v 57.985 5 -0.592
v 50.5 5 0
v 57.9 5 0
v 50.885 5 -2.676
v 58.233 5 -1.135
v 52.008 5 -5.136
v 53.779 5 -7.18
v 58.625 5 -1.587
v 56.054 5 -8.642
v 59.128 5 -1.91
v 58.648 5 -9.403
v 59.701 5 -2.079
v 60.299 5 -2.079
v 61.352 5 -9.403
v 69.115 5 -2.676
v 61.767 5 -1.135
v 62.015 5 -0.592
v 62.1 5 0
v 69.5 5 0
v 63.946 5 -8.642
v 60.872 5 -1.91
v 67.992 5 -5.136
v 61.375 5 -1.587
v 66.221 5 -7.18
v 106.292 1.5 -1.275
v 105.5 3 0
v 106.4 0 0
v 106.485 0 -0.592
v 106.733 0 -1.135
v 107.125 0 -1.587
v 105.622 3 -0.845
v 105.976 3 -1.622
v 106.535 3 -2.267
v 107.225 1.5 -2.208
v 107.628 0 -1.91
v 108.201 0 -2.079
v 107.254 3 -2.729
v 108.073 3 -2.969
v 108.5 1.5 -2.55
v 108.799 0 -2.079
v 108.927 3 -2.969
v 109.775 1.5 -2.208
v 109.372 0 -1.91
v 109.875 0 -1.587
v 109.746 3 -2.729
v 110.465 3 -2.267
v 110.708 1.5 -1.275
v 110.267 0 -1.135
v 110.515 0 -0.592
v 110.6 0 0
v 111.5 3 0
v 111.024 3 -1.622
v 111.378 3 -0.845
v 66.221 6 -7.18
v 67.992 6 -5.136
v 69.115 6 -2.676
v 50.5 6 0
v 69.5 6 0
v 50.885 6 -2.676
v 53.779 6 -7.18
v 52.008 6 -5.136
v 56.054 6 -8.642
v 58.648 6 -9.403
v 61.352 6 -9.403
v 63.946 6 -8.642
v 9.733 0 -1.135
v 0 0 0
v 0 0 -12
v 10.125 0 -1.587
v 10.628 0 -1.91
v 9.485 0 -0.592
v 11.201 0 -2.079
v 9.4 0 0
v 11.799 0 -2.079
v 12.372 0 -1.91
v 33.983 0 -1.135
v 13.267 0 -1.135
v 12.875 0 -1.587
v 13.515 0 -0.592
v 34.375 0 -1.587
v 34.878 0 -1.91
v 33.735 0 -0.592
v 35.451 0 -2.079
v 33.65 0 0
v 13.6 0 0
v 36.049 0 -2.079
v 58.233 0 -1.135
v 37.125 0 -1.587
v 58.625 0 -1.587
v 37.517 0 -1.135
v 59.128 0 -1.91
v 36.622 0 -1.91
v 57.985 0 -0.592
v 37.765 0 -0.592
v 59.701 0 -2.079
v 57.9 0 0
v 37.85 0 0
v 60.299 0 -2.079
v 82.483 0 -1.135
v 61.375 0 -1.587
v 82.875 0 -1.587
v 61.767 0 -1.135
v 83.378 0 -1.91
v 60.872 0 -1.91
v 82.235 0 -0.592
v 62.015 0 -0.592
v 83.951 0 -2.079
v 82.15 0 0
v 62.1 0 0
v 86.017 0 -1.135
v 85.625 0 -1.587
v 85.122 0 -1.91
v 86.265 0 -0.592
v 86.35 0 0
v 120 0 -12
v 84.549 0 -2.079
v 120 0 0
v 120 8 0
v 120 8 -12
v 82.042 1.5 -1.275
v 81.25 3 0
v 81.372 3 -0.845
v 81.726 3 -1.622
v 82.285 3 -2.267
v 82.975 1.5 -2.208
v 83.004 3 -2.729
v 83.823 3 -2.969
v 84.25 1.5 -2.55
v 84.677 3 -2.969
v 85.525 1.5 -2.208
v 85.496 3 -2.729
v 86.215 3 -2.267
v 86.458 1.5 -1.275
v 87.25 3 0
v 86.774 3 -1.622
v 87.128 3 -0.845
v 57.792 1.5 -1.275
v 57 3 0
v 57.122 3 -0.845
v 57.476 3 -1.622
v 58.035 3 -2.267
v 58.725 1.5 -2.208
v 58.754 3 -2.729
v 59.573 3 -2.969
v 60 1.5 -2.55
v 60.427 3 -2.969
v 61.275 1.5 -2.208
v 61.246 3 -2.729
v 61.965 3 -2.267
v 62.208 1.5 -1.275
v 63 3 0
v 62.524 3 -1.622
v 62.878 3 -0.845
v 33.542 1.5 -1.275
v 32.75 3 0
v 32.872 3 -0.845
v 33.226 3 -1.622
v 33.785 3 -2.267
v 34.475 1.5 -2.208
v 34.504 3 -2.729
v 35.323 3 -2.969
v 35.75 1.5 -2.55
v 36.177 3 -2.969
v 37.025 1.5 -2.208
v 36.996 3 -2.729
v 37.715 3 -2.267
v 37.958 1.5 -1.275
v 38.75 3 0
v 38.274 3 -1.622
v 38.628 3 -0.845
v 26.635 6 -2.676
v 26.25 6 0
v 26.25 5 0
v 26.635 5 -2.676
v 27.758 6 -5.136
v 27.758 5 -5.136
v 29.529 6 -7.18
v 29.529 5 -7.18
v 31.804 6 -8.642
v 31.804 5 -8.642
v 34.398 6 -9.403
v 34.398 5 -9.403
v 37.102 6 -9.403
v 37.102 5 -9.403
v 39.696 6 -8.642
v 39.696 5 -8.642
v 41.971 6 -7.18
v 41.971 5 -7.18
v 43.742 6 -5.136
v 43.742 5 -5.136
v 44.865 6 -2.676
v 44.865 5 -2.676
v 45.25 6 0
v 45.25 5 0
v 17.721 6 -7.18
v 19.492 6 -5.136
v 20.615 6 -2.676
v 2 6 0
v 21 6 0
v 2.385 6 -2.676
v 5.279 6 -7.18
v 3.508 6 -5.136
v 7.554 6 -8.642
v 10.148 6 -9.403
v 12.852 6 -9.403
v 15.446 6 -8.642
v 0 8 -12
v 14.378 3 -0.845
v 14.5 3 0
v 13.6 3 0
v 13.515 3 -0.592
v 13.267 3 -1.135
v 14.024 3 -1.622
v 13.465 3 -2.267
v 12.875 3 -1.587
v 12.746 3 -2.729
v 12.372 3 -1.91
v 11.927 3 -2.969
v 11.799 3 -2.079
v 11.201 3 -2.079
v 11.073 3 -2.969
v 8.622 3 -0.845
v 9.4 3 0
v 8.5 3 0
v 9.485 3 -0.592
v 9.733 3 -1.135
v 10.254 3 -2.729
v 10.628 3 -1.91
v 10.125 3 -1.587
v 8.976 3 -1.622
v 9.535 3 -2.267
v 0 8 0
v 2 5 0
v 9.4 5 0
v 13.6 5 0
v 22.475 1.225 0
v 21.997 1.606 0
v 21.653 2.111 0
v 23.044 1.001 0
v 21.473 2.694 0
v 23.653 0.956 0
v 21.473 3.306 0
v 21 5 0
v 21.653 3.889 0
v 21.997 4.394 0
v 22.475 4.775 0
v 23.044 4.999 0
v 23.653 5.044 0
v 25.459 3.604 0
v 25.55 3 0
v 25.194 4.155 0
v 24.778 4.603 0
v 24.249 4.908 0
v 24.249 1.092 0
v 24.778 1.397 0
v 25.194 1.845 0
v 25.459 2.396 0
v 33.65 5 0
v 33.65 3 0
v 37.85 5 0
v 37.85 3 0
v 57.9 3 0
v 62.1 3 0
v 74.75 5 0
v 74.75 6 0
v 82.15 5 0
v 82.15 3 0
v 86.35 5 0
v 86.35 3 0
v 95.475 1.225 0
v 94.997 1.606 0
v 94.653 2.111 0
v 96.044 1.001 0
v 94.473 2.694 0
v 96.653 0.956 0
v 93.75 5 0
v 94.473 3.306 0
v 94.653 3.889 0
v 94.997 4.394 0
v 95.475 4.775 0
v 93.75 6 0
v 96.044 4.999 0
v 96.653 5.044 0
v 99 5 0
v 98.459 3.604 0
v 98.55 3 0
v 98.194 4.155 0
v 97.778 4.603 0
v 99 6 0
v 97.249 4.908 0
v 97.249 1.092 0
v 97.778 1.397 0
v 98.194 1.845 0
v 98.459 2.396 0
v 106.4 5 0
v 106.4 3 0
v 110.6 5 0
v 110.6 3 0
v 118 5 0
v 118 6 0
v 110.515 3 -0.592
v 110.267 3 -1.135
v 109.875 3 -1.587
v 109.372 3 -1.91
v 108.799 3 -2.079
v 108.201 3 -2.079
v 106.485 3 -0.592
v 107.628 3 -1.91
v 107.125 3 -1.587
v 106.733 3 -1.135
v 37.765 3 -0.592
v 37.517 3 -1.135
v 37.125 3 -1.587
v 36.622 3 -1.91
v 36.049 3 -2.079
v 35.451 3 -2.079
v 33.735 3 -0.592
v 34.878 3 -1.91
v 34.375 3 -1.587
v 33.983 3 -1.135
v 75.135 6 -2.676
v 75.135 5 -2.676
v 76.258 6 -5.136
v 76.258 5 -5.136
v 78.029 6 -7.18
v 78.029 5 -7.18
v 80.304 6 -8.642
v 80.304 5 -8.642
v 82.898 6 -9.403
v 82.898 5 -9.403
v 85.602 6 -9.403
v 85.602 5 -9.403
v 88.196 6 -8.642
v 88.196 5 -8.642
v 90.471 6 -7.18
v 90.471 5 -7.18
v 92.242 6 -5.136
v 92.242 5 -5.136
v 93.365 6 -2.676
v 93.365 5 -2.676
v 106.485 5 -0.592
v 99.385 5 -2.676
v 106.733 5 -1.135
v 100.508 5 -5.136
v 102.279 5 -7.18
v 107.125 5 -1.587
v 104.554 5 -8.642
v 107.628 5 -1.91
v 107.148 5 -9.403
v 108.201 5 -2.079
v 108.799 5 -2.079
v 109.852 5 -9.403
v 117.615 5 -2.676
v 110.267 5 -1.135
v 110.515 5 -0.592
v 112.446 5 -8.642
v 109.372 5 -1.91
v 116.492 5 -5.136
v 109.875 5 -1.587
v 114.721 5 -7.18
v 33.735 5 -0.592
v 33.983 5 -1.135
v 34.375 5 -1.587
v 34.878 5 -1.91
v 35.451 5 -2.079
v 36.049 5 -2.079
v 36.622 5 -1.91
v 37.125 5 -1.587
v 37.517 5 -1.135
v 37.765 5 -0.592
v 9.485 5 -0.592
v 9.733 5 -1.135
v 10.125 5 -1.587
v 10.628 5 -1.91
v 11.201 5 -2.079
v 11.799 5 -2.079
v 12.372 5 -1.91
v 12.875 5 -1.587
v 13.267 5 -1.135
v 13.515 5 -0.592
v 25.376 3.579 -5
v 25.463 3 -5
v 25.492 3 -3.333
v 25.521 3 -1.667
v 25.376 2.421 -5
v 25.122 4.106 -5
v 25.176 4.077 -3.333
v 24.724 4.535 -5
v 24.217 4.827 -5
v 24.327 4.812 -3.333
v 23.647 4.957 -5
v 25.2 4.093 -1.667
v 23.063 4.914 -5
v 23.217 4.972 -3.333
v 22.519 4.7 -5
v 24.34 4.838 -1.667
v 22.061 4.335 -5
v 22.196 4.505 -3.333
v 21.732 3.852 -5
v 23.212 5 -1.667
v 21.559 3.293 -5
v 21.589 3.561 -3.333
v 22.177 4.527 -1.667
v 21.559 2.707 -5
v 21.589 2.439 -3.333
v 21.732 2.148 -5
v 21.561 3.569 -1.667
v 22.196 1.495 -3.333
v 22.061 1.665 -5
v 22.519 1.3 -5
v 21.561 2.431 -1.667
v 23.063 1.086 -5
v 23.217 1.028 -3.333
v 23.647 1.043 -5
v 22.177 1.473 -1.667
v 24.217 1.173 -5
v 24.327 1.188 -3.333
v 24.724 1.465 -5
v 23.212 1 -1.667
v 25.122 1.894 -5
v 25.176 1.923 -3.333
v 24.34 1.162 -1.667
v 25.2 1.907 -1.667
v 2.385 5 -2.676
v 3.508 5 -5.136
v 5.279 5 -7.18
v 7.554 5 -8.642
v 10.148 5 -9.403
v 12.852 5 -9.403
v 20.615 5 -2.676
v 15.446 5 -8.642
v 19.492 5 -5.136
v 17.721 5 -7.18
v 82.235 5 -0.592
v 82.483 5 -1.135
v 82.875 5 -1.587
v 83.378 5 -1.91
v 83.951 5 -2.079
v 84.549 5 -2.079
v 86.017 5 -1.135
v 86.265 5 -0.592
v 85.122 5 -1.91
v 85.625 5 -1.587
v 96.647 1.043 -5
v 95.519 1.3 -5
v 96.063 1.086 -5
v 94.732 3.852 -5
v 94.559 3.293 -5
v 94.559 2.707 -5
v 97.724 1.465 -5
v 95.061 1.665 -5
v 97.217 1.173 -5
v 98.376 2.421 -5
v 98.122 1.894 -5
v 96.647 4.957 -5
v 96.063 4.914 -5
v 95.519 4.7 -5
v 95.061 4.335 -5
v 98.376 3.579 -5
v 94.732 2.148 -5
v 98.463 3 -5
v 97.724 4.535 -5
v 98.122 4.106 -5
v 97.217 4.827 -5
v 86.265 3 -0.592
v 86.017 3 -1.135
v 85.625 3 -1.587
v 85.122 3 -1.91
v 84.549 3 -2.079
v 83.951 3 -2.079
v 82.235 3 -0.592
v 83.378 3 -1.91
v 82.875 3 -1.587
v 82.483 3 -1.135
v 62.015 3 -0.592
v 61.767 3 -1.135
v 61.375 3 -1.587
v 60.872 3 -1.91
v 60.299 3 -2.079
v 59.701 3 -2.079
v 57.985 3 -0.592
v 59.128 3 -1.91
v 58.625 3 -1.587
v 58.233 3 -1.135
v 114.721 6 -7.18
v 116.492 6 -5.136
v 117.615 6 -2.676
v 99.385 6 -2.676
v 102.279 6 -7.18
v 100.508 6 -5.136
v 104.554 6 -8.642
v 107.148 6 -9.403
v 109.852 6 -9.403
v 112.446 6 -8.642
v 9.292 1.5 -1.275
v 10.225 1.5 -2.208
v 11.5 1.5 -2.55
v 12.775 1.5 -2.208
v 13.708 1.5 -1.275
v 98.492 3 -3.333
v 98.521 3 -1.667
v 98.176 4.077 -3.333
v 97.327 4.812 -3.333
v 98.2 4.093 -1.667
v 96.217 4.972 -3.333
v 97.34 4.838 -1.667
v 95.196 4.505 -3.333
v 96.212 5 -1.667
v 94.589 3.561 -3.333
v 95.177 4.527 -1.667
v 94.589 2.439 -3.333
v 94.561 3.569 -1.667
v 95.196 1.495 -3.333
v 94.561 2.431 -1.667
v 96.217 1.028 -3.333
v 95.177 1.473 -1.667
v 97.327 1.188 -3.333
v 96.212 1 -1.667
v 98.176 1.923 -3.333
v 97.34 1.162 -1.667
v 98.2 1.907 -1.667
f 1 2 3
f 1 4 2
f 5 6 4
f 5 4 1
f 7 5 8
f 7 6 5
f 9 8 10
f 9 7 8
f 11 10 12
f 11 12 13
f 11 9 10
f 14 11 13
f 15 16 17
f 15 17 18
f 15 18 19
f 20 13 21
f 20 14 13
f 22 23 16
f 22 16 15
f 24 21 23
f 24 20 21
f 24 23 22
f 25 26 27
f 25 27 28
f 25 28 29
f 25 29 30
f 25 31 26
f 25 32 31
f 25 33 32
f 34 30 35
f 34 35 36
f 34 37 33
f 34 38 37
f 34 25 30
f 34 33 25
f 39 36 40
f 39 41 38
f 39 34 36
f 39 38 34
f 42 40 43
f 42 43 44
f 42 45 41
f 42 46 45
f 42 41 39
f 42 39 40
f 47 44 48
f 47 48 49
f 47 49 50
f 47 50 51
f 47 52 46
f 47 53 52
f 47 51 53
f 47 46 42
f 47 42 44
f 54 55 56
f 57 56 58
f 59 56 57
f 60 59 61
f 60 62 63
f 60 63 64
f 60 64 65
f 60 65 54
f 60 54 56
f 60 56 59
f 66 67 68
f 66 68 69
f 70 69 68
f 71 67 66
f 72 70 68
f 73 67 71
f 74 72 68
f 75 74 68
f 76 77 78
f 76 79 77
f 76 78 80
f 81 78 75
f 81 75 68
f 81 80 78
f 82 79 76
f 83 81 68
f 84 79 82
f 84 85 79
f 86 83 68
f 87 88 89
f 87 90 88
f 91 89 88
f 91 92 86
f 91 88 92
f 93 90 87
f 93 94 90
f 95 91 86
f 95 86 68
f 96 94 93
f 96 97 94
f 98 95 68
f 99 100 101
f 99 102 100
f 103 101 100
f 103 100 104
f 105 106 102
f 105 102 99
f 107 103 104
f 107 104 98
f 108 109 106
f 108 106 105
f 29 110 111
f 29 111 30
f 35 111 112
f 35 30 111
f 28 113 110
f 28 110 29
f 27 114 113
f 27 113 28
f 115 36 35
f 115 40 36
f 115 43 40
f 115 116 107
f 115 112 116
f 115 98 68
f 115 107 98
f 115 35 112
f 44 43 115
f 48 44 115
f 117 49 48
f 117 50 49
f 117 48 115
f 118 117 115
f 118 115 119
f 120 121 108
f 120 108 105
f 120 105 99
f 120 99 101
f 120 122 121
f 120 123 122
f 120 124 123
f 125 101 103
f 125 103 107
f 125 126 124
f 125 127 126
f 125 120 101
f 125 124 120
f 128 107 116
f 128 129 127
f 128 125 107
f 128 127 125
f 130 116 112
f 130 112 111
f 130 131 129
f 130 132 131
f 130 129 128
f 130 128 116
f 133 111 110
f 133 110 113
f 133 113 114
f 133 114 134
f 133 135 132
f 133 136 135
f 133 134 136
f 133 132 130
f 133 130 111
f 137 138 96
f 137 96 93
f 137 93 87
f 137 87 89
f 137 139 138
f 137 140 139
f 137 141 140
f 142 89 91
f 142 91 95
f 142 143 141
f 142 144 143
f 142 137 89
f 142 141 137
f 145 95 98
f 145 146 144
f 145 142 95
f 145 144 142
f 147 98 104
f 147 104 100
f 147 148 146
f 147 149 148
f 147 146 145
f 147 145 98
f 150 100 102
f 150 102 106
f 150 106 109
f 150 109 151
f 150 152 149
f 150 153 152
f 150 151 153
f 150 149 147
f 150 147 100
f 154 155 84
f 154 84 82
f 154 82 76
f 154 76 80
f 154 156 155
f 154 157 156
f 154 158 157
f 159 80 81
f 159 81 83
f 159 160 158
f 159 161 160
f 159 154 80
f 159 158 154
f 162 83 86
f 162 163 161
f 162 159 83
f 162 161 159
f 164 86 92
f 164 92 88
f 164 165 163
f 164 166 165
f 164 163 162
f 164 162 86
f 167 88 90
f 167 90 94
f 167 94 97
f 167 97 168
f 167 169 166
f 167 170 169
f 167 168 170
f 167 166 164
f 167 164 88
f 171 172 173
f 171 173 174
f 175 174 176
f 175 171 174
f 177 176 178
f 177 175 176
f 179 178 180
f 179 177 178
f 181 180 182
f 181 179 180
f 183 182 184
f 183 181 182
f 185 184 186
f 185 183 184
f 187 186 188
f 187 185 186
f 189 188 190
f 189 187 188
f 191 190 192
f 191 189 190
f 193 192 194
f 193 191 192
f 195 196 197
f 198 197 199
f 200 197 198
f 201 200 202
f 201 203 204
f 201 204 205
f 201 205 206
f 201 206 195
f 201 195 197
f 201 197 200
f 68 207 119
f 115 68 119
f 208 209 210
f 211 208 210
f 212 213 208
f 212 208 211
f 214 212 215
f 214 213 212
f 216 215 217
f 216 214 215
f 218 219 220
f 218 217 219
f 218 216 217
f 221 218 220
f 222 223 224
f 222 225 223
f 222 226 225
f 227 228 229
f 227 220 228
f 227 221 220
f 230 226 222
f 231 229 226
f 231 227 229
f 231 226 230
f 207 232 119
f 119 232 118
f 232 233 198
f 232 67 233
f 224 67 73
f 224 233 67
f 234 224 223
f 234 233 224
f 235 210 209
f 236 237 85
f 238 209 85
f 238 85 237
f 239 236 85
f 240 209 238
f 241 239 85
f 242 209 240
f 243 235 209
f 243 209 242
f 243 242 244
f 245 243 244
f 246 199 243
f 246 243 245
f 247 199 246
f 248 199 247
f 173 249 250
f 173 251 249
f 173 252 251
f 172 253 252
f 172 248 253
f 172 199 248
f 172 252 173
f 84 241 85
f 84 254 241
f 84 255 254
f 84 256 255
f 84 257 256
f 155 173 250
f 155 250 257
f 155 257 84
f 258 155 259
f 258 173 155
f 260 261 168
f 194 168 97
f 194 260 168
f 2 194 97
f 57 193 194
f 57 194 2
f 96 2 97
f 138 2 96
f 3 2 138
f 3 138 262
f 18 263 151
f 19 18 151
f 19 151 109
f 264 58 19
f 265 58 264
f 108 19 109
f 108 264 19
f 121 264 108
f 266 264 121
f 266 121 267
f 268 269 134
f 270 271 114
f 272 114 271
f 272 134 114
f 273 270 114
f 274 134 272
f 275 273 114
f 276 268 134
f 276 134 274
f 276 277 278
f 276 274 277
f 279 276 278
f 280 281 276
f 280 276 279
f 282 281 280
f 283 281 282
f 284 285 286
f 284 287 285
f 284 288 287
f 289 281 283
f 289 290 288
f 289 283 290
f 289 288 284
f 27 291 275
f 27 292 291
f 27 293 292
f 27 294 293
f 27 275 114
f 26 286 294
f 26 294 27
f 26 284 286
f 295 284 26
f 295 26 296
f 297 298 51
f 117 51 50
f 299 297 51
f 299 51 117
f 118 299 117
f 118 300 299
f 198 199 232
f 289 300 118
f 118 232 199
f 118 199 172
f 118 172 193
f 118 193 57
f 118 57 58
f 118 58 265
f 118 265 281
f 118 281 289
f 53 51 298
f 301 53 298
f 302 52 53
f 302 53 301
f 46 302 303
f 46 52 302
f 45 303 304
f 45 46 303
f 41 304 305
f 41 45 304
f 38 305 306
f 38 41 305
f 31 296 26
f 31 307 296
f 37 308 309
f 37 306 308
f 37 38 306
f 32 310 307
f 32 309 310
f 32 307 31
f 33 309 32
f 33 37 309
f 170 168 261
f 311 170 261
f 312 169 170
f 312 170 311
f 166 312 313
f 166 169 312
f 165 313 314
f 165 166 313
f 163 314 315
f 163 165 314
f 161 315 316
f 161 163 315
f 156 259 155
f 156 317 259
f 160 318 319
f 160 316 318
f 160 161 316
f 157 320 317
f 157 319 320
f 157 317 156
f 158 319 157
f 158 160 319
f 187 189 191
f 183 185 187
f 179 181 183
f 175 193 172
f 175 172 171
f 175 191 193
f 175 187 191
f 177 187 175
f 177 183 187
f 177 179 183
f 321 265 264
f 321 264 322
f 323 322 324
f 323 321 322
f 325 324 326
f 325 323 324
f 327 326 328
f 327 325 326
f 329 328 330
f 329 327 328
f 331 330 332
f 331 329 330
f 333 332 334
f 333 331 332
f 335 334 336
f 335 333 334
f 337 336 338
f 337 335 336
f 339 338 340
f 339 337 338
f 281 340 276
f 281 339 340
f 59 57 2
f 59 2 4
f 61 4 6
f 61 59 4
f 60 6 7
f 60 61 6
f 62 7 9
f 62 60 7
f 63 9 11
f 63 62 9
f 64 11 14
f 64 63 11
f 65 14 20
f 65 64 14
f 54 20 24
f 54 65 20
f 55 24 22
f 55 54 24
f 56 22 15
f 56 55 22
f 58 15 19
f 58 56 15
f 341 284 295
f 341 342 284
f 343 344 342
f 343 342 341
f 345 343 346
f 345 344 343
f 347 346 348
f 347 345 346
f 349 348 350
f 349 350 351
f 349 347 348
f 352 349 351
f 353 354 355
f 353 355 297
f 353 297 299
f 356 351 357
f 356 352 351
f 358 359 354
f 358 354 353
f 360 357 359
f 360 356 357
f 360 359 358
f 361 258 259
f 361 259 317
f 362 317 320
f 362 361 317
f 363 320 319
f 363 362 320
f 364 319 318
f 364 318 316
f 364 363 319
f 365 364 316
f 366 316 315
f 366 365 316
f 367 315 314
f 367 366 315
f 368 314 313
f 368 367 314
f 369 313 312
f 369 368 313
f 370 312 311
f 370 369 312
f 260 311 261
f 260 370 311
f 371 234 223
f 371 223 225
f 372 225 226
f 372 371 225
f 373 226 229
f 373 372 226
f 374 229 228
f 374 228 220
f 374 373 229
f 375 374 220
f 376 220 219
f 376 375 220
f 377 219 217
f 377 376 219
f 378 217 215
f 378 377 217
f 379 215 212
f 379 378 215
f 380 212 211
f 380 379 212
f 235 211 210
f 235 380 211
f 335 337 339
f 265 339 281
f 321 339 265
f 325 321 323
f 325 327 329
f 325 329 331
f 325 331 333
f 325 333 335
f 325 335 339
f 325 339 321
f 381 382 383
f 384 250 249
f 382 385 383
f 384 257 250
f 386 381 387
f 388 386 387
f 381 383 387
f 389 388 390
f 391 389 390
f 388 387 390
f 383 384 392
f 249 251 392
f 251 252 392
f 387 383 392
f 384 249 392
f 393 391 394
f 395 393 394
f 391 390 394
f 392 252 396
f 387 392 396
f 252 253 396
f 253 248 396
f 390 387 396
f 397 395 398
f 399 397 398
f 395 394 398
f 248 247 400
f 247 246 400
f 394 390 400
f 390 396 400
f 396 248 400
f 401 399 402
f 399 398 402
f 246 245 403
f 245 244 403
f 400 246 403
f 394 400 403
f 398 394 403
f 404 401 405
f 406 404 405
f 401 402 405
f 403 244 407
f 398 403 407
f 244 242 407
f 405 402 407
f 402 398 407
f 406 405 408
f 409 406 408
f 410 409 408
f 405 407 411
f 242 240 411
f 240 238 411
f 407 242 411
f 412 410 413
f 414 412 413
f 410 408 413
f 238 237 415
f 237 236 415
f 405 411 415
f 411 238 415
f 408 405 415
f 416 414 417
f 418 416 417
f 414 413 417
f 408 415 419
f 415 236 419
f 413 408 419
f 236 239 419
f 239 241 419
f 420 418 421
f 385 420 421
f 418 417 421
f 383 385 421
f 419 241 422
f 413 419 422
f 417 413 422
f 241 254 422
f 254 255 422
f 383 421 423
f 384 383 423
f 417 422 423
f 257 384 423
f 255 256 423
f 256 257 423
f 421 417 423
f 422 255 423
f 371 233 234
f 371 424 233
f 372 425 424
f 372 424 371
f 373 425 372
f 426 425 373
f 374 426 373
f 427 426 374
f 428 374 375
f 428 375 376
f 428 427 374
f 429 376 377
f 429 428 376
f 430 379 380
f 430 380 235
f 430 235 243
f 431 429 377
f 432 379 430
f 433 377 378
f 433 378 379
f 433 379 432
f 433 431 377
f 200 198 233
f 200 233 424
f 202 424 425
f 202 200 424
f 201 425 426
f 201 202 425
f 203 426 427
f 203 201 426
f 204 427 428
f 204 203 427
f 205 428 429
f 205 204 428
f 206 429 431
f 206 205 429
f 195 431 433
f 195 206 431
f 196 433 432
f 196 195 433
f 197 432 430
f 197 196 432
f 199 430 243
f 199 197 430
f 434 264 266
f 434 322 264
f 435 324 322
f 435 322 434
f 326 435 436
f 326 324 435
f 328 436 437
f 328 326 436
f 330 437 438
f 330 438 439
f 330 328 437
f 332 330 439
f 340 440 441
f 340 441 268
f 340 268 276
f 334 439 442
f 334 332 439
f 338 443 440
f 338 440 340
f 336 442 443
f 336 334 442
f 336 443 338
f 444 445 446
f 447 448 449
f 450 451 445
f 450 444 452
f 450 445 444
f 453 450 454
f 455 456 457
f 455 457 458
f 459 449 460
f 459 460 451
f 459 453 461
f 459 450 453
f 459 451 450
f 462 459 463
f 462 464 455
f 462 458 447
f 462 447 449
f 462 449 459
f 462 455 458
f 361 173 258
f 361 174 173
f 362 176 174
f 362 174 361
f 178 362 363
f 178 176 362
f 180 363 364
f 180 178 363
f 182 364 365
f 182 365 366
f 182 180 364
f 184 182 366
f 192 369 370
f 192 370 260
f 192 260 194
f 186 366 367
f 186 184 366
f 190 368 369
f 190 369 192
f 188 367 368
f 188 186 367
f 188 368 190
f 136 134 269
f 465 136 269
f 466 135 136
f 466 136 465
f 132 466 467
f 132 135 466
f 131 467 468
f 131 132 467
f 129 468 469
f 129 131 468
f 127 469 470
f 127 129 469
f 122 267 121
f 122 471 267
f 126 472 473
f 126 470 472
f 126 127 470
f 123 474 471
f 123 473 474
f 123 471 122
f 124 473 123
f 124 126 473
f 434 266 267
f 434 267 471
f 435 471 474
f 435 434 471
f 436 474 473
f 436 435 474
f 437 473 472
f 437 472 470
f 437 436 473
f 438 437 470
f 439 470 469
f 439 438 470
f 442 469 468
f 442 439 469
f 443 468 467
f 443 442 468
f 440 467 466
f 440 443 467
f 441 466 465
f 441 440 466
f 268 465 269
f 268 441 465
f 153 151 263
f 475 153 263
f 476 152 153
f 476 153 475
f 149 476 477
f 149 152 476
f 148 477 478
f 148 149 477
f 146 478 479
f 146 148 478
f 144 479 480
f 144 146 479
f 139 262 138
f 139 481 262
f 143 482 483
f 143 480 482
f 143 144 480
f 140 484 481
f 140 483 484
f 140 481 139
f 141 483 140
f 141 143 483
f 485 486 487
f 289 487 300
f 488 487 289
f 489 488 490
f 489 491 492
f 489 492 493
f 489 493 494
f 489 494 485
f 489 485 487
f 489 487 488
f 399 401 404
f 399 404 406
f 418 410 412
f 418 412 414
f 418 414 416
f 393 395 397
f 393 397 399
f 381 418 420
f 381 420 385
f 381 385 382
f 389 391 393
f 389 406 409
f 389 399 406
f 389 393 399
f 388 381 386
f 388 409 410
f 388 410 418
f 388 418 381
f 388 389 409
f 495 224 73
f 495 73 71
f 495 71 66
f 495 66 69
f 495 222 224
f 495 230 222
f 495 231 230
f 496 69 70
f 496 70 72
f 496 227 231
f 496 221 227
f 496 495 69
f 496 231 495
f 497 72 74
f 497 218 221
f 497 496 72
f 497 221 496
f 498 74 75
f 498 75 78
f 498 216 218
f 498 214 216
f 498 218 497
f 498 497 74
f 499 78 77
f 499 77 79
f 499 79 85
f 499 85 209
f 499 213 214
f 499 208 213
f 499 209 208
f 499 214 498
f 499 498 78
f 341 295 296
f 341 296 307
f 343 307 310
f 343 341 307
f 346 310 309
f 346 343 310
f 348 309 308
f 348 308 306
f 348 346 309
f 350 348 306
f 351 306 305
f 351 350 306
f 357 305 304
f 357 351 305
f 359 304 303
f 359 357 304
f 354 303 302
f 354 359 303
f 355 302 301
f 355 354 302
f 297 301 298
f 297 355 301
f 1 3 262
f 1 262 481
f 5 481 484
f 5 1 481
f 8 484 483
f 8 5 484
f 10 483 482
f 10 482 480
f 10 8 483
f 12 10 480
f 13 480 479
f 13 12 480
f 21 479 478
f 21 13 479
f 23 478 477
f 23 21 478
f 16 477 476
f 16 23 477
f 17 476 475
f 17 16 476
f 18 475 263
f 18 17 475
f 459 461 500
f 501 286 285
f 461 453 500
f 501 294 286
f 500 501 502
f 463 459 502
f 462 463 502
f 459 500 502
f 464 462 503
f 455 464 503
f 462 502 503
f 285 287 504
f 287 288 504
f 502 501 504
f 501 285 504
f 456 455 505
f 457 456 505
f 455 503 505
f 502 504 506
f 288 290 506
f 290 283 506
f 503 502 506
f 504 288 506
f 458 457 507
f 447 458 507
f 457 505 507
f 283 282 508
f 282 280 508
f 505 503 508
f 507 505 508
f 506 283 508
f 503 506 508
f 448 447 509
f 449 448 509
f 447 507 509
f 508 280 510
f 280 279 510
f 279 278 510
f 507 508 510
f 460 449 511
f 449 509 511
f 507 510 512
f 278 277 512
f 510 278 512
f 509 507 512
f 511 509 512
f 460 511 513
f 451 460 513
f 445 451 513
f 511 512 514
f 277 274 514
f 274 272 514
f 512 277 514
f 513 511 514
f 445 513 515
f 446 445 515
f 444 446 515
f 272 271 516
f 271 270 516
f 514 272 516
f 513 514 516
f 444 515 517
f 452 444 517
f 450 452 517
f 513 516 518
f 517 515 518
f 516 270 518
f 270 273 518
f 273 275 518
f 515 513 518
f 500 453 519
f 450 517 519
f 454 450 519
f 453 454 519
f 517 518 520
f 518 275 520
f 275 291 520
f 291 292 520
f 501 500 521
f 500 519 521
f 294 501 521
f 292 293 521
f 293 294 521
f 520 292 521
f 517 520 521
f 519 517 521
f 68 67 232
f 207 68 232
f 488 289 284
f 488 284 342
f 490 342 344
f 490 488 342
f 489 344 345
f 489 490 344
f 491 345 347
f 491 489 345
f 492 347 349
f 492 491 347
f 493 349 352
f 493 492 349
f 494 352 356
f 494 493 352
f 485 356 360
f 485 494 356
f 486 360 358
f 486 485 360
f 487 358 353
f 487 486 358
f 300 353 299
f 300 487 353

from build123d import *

# Parameters (mm, degrees)
SKETCH2_W                    = 120
SKETCH2_H                    = 8
BOSS_EXTRUDE1_DEPTH          = 12
LPATTERN1_COUNT              = 5
LPATTERN1_PITCH              = 24.25
SKETCH4_R                    = 2.05
CUT_EXTRUDE1_DEPTH           = 5
CUT_EXTRUDE1_DRAFT           = -1
CUT_EXTRUDE1_PROFILE_2_DEPTH = 5
CUT_EXTRUDE1_PROFILE_2_DRAFT = -1


with BuildPart() as part:
    # Sketch2 → Boss-Extrude1 (new body)
    with BuildSketch(Plane.XY):
        with Locations((60, 4)):
            Rectangle(SKETCH2_W, SKETCH2_H)
    extrude(amount=-BOSS_EXTRUDE1_DEPTH)

    # Sketch3 → Cut-Revolve1 (revolve, cut)
    with BuildSketch(Plane.XY):
        Polygon((8.5, 3), (9.4, 3), (9.4, 5), (2, 5), (2, 6), (11.5, 6), (11.5, 0), (9.4, 0), align=None)
    cut_revolve1 = revolve(axis=Axis((11.5, 6, 0), (0, -1, 0)), mode=Mode.SUBTRACT)

    # LPattern1: Cut-Revolve1 ×5
    with Locations(*[(i * LPATTERN1_PITCH, 0, 0) for i in range(1, LPATTERN1_COUNT)]):
        add(cut_revolve1, mode=Mode.SUBTRACT)


with BuildPart() as cut_extrude1_tool:
    # Sketch4 → Cut-Extrude1 (with draft: the straight prism first)
    with BuildSketch(Plane.XY):
        with Locations((23.5, 3)):
            Circle(SKETCH4_R)
    extrude(amount=-CUT_EXTRUDE1_DEPTH)
    # Cut-Extrude1: the draft: its side faces are tilted about the plane it starts from
    cut_extrude1_sides = [cut_extrude1_tool.faces().sort_by_distance(p)[0] for p in [
        (21.45, 3, -2.5),
    ]]
    draft(cut_extrude1_sides, Plane.XY, CUT_EXTRUDE1_DRAFT)


with BuildPart() as part_1:
    add(part.part)

    # Cut-Extrude1: cut by cut_extrude1_tool
    add(cut_extrude1_tool.part, mode=Mode.SUBTRACT)


with BuildPart() as cut_extrude1_profile_2_tool:
    # Sketch4 → Cut-Extrude1 profile 2 (with draft: the straight prism first)
    with BuildSketch(Plane.XY):
        with Locations((96.5, 3)):
            Circle(SKETCH4_R)
    extrude(amount=-CUT_EXTRUDE1_PROFILE_2_DEPTH)
    # Cut-Extrude1 profile 2: the draft: its side faces are tilted about the plane it starts from
    cut_extrude1_profile_2_sides = [cut_extrude1_profile_2_tool.faces().sort_by_distance(p)[0] for p in [
        (94.45, 3, -2.5),
    ]]
    draft(cut_extrude1_profile_2_sides, Plane.XY, CUT_EXTRUDE1_PROFILE_2_DRAFT)


with BuildPart() as part_2:
    add(part_1.part)

    # Cut-Extrude1 profile 2: cut by cut_extrude1_profile_2_tool
    add(cut_extrude1_profile_2_tool.part, mode=Mode.SUBTRACT)


solid = part_2.part
